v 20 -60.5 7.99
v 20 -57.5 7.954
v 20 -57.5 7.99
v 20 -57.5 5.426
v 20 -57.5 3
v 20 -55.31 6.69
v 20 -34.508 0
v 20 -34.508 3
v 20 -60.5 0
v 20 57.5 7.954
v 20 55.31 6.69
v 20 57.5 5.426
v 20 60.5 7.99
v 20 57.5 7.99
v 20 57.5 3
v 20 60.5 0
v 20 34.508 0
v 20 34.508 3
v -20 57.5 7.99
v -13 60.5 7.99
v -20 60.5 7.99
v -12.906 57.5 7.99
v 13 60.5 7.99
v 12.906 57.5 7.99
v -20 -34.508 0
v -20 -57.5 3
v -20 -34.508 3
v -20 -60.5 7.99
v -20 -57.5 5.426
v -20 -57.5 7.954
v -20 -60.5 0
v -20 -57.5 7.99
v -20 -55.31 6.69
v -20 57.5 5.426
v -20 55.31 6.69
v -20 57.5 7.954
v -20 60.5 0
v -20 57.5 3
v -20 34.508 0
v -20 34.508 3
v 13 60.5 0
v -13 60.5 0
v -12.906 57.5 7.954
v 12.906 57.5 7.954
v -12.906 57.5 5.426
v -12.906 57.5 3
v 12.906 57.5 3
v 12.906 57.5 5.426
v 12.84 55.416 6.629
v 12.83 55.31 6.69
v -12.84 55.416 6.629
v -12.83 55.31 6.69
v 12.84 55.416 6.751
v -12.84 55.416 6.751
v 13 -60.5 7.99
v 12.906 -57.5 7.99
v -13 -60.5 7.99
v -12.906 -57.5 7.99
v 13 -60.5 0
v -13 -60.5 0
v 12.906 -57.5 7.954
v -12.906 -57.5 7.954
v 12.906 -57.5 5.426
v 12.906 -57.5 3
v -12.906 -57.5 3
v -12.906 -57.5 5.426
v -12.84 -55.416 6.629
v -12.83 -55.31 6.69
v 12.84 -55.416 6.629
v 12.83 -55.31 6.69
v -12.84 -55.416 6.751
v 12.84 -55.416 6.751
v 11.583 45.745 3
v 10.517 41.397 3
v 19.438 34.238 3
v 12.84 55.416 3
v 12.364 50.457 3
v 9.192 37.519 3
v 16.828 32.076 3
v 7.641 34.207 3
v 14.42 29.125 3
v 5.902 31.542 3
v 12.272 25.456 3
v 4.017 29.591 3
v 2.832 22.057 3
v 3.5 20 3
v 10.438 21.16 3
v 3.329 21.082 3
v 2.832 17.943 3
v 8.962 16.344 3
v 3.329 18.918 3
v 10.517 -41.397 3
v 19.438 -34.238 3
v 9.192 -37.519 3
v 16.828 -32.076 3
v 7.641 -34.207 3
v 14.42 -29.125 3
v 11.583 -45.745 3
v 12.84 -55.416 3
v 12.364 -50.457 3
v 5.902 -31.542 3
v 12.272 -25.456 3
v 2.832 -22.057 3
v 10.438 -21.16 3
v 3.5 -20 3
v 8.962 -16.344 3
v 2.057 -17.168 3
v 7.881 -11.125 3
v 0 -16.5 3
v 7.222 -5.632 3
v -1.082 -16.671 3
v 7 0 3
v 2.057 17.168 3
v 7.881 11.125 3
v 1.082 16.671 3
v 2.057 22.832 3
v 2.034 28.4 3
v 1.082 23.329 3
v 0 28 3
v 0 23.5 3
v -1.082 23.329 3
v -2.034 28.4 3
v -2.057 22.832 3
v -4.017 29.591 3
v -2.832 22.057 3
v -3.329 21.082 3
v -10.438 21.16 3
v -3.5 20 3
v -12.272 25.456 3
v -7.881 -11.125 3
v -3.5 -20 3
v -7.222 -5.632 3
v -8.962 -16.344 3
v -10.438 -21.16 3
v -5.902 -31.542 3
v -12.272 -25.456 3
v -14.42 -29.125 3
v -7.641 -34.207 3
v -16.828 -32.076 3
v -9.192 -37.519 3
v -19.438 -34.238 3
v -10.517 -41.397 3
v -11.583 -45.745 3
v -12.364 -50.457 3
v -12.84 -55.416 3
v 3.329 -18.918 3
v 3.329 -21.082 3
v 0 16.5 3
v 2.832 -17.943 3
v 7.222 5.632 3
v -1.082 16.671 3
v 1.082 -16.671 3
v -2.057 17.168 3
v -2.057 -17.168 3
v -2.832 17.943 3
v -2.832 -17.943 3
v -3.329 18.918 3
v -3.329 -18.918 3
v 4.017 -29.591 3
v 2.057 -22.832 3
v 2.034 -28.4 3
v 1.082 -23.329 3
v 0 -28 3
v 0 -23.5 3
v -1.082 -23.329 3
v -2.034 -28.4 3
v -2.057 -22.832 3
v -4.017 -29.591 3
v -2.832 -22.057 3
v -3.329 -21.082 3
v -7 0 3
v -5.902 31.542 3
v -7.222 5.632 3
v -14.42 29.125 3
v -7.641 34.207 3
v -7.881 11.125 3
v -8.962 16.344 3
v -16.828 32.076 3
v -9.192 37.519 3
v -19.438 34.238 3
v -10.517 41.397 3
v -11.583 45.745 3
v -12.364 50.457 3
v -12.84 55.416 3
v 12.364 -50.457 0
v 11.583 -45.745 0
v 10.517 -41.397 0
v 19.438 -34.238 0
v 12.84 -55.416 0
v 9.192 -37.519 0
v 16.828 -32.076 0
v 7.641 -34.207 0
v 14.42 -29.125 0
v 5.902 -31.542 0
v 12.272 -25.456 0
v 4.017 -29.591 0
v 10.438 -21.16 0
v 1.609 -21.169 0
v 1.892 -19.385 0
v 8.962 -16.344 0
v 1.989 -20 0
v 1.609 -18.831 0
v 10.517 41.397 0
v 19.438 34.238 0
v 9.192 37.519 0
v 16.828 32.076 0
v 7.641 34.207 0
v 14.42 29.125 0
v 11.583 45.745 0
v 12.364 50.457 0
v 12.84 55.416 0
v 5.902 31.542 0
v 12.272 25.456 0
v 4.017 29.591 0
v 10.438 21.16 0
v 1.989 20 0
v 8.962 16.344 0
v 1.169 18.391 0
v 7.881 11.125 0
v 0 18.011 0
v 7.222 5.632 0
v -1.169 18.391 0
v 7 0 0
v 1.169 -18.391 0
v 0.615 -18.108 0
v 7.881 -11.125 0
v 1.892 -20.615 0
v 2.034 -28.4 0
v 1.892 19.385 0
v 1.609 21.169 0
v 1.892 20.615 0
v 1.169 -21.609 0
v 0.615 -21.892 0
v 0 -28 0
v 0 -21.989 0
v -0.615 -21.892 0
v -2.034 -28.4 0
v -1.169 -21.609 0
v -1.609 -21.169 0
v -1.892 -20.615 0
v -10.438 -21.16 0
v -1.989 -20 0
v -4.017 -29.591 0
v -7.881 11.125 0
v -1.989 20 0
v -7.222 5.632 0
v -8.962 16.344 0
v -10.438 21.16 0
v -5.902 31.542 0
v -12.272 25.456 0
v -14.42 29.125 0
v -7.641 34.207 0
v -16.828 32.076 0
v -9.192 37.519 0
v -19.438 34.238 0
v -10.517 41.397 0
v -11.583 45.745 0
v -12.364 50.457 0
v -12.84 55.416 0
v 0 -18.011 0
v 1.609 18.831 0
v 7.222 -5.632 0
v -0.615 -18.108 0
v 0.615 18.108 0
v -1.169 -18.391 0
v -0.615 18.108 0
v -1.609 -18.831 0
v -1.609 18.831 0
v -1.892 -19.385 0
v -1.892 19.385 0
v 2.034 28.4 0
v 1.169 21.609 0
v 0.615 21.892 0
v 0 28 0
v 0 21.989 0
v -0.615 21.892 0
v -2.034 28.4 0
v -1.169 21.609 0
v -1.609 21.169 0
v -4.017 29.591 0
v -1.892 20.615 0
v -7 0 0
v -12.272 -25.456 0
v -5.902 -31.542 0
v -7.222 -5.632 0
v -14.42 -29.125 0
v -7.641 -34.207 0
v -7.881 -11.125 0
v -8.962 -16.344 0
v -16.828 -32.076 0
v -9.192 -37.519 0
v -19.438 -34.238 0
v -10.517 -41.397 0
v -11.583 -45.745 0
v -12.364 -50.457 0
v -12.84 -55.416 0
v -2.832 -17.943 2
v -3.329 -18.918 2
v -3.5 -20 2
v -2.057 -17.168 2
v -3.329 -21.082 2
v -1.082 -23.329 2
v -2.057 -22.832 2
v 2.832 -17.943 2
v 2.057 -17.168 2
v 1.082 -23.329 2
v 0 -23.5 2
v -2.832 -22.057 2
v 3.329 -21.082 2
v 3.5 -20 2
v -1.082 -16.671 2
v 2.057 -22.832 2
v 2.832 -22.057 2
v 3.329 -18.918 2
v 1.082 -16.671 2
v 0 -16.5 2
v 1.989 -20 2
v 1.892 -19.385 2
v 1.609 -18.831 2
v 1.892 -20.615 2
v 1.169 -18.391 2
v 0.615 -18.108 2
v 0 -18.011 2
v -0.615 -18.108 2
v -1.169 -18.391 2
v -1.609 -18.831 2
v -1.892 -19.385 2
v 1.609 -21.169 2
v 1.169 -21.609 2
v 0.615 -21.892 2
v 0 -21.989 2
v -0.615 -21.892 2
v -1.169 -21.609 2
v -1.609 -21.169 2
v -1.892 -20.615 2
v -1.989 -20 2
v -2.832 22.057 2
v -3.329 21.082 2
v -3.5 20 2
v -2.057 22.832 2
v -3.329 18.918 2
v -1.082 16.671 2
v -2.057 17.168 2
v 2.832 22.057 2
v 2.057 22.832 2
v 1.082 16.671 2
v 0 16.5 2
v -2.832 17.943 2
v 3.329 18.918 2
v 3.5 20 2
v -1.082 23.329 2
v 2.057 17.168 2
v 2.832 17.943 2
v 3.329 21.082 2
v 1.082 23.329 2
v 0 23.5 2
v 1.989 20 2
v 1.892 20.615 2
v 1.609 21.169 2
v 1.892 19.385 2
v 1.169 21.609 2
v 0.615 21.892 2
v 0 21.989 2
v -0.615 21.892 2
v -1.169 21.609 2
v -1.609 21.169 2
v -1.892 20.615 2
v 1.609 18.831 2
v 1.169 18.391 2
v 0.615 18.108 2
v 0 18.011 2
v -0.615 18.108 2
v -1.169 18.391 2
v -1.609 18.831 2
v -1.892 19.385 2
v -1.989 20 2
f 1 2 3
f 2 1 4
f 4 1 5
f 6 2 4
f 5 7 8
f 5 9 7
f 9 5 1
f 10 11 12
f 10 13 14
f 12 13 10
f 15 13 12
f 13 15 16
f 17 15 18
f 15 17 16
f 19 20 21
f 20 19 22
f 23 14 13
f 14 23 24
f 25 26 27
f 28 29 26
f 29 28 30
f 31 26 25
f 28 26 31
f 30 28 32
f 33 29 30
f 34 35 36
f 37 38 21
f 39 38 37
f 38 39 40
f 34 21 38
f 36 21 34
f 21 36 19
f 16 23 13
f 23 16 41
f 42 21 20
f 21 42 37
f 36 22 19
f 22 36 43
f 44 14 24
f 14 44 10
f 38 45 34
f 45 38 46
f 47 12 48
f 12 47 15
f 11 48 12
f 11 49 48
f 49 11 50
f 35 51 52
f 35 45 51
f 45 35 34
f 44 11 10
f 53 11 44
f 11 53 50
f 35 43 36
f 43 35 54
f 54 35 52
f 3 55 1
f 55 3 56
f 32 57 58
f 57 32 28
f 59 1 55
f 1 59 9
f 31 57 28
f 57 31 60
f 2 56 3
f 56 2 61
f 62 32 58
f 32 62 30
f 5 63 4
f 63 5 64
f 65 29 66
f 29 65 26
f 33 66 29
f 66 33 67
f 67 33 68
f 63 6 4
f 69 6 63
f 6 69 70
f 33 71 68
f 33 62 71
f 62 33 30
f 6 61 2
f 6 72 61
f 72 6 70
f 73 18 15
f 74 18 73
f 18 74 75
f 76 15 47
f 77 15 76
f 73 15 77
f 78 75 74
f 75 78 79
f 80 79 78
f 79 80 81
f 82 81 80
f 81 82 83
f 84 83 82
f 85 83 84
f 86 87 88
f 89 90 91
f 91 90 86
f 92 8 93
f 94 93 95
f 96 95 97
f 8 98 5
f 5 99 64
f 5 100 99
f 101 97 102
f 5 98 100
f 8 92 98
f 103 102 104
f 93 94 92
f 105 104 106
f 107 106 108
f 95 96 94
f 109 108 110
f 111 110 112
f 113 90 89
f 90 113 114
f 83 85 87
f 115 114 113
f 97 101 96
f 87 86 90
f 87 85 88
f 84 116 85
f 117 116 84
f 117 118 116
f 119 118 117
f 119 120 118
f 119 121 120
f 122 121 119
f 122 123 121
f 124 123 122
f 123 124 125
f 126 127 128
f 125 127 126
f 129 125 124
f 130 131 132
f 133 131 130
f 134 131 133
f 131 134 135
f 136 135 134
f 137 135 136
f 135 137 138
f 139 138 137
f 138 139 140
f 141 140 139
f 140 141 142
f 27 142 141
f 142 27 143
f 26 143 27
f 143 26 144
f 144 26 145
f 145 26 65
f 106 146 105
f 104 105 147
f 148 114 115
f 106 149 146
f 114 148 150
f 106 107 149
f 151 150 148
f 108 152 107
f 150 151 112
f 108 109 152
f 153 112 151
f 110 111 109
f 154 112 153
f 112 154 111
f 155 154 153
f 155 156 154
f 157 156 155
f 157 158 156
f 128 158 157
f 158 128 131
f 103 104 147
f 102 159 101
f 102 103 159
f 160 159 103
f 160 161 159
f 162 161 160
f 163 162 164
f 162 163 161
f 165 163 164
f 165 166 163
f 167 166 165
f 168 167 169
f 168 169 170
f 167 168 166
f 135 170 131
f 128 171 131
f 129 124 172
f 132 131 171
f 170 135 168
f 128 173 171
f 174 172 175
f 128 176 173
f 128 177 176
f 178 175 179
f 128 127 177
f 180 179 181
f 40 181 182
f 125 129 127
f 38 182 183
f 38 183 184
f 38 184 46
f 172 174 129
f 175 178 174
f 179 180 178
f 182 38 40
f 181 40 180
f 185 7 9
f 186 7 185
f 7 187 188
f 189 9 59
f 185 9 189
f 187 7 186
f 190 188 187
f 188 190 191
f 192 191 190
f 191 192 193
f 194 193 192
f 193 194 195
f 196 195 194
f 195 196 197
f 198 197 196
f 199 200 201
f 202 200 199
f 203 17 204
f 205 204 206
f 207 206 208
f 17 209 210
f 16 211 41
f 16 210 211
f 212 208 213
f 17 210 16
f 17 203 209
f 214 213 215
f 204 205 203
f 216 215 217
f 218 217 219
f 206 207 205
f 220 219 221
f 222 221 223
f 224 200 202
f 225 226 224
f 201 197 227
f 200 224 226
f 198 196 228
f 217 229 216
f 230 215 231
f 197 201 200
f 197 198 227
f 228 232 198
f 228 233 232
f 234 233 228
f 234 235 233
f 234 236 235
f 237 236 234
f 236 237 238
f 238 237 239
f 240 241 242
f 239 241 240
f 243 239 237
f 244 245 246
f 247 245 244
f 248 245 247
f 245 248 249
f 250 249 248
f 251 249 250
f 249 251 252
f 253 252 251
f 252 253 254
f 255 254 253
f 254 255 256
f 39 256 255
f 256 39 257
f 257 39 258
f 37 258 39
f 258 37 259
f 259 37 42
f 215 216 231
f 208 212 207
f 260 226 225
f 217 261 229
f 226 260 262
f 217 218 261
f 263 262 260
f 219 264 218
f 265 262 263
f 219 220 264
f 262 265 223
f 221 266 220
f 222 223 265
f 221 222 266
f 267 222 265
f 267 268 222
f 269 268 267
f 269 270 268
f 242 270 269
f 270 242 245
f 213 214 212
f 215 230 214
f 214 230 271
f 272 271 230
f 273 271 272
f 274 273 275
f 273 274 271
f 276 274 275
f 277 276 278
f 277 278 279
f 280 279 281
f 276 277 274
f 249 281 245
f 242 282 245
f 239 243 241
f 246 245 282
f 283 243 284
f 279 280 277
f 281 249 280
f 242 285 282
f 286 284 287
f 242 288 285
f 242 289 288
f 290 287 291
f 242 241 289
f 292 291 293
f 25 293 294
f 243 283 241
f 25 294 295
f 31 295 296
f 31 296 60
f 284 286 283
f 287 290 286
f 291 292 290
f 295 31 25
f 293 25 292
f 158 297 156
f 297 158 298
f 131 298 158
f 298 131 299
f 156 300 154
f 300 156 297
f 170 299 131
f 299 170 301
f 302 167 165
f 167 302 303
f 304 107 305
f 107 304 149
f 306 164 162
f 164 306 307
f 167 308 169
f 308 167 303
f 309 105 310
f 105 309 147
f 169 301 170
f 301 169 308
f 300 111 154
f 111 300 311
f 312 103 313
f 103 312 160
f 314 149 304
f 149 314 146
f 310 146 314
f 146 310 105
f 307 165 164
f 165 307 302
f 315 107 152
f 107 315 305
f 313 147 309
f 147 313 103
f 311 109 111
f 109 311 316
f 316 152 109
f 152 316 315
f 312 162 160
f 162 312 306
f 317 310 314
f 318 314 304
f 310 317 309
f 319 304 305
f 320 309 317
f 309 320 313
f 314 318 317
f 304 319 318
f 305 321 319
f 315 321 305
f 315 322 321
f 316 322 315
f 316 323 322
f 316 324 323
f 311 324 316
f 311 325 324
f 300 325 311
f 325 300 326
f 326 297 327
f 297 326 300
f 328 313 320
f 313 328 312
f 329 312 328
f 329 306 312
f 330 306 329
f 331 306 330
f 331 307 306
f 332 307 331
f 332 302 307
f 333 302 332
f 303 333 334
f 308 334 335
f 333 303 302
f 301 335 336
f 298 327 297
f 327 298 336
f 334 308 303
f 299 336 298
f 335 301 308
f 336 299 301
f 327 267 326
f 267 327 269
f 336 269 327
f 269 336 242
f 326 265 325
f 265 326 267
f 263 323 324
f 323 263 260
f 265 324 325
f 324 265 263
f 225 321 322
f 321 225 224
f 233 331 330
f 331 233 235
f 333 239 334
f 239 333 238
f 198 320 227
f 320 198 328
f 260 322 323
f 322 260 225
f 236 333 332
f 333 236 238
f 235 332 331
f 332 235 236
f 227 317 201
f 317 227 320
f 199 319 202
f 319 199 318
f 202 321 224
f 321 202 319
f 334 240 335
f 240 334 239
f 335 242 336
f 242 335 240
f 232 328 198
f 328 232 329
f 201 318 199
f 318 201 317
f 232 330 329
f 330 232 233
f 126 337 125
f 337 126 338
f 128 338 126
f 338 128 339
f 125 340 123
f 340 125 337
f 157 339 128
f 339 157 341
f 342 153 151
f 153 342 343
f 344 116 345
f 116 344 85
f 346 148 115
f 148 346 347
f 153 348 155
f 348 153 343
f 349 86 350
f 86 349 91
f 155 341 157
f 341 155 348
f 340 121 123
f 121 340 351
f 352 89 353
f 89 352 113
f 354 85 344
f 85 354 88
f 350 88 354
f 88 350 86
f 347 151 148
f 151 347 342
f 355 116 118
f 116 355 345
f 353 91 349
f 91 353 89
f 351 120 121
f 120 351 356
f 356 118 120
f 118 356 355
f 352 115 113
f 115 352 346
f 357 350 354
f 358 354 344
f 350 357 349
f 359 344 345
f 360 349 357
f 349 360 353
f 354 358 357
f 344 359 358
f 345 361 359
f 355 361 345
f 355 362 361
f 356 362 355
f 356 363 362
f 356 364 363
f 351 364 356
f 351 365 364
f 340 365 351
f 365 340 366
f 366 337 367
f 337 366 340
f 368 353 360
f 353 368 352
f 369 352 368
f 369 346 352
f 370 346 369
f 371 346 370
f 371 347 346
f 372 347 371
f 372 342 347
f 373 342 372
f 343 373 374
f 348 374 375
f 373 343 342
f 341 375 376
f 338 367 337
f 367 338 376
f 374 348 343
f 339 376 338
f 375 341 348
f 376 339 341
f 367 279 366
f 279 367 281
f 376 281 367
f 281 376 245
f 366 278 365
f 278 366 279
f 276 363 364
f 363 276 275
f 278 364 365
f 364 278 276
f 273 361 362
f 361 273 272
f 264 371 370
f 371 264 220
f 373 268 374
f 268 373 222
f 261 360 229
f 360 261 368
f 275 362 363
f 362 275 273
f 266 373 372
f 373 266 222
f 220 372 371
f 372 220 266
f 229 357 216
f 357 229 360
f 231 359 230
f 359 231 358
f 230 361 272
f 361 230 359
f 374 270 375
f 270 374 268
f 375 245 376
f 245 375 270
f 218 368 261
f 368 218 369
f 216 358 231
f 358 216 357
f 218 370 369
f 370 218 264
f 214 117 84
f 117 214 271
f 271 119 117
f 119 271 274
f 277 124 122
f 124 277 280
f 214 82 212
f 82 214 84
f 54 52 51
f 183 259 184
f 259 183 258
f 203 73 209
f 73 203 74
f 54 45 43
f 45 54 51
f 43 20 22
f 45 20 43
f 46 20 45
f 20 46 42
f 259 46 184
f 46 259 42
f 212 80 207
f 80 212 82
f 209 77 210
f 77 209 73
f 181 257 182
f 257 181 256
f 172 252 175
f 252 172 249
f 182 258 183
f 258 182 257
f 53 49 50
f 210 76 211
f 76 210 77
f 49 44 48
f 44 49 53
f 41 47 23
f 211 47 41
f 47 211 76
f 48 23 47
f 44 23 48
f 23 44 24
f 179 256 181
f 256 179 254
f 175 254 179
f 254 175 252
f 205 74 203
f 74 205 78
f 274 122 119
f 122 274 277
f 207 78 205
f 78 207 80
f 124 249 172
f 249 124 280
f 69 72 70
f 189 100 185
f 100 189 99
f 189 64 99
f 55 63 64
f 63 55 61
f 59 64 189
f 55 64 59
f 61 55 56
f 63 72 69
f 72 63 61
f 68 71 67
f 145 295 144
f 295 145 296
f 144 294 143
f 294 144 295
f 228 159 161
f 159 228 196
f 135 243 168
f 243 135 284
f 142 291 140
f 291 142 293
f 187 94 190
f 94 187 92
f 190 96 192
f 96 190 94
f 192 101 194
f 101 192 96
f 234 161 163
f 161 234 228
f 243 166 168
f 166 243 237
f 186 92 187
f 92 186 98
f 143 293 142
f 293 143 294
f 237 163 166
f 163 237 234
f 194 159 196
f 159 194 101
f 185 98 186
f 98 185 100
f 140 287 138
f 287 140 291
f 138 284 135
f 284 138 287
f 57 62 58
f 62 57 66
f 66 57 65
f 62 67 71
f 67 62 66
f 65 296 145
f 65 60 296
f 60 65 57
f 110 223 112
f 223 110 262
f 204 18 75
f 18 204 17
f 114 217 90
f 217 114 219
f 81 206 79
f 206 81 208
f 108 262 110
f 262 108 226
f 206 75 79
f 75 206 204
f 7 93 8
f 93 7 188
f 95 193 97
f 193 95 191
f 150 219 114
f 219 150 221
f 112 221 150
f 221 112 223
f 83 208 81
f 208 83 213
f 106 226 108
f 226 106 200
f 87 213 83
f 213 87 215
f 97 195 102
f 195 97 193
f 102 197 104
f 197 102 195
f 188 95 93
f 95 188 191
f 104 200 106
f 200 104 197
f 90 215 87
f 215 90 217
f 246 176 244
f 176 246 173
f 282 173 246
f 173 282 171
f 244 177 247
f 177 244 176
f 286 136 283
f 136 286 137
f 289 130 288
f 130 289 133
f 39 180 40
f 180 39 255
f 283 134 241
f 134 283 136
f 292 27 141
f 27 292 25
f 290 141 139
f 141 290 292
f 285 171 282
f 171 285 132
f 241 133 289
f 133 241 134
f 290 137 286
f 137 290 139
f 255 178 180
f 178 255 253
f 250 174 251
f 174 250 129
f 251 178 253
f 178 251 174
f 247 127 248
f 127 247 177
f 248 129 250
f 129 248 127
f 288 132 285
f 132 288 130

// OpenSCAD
// a simple mount for a v2 ninja block
//
//
use <MCAD/regular_shapes.scad>;
use <MCAD/nuts_and_bolts.scad>;

njb_h = 115;
njb_w = 80;
njb_lip_w = 3;
njb_lip_d = 6.5;

thickness = 3;
plate_w = 40;
plate_l = njb_h + (thickness*2);
plate_h = thickness;

lip_h = njb_lip_w + 2;

padding = 0.01; // to preserve manifold

//////////////////////////////////////////////////////////////////////////////
//
module lip() {
    translate([0,0,lip_h / 2]) {
        cube( size = [plate_w, thickness, lip_h], center = true);
    }

    // we basically use an extended triangle to be the 'catch' that
    // holds the ninjblock v2 in place.
    //
    // translate([-plate_w/2,2-padding,lip_h-0.9]) {
    translate([plate_w/2,-2.2+padding,lip_h-1.3]) {
        rotate(a = [180,90,0]) {
            triangle_prism(plate_w,1.5);
        }
    }
}

//////////////////////////////////////////////////////////////////////////////
//
module screw_hole() {
    translate([0,0,2]) {
        rotate(a=[0,180,0]) {
            boltHole(size = 4,length = 5);
        }
    }
}

//////////////////////////////////////////////////////////////////////////////
//
module njb_v2_mount() {
    difference() {
        union() {
            // bottom plate that mounts against the wall/door/etc.
            //
            translate([0,0,(plate_h/2)]) {
                cube( size = [plate_w, plate_l, plate_h], center = true);
            }

            // The "lips" on the top and bottom which are what the ninja block
            // v2 will rest on.
            //
            translate([0, plate_l/2-(thickness/2), thickness-padding]) {
                lip();
            }
            translate([0, -plate_l/2 + (thickness/2), thickness-padding]) {
                rotate(a=[0,0,180]) {
                    lip();
                }
            }
        }

        // Holes for screws.
        //
        translate([0,-20,0]) {
            screw_hole();
        }
        translate([0,20,0]) {
            screw_hole();
        }

        // We cut some shaped cylinders out of the basic shape to make
        // it use less plastic and be less blockish.
        //
        translate([0,plate_l / 2,-padding]) {
            scale( v = [1,2.5,1] ) {
                cylinder(h = 20, r = 13, $fn = 40);
            }
        }
        translate([0,-plate_l / 2,-padding]) {
            scale( v = [1,2.5,1] ) {
                cylinder(h = 20, r = 13, $fn = 40);
            }
        }
        translate([plate_w/2+5,0,-padding]) {
            scale( v = [1,2,1] ) {
                cylinder(h = 20, r = 18, $fn = 40);
            }
        }
        translate([-plate_w/2-5,0,-padding]) {
            scale( v = [1,2,1] ) {
                cylinder(h = 20, r = 18, $fn = 40);
            }
        }
    }
}
$fn = 20;
njb_v2_mount();
